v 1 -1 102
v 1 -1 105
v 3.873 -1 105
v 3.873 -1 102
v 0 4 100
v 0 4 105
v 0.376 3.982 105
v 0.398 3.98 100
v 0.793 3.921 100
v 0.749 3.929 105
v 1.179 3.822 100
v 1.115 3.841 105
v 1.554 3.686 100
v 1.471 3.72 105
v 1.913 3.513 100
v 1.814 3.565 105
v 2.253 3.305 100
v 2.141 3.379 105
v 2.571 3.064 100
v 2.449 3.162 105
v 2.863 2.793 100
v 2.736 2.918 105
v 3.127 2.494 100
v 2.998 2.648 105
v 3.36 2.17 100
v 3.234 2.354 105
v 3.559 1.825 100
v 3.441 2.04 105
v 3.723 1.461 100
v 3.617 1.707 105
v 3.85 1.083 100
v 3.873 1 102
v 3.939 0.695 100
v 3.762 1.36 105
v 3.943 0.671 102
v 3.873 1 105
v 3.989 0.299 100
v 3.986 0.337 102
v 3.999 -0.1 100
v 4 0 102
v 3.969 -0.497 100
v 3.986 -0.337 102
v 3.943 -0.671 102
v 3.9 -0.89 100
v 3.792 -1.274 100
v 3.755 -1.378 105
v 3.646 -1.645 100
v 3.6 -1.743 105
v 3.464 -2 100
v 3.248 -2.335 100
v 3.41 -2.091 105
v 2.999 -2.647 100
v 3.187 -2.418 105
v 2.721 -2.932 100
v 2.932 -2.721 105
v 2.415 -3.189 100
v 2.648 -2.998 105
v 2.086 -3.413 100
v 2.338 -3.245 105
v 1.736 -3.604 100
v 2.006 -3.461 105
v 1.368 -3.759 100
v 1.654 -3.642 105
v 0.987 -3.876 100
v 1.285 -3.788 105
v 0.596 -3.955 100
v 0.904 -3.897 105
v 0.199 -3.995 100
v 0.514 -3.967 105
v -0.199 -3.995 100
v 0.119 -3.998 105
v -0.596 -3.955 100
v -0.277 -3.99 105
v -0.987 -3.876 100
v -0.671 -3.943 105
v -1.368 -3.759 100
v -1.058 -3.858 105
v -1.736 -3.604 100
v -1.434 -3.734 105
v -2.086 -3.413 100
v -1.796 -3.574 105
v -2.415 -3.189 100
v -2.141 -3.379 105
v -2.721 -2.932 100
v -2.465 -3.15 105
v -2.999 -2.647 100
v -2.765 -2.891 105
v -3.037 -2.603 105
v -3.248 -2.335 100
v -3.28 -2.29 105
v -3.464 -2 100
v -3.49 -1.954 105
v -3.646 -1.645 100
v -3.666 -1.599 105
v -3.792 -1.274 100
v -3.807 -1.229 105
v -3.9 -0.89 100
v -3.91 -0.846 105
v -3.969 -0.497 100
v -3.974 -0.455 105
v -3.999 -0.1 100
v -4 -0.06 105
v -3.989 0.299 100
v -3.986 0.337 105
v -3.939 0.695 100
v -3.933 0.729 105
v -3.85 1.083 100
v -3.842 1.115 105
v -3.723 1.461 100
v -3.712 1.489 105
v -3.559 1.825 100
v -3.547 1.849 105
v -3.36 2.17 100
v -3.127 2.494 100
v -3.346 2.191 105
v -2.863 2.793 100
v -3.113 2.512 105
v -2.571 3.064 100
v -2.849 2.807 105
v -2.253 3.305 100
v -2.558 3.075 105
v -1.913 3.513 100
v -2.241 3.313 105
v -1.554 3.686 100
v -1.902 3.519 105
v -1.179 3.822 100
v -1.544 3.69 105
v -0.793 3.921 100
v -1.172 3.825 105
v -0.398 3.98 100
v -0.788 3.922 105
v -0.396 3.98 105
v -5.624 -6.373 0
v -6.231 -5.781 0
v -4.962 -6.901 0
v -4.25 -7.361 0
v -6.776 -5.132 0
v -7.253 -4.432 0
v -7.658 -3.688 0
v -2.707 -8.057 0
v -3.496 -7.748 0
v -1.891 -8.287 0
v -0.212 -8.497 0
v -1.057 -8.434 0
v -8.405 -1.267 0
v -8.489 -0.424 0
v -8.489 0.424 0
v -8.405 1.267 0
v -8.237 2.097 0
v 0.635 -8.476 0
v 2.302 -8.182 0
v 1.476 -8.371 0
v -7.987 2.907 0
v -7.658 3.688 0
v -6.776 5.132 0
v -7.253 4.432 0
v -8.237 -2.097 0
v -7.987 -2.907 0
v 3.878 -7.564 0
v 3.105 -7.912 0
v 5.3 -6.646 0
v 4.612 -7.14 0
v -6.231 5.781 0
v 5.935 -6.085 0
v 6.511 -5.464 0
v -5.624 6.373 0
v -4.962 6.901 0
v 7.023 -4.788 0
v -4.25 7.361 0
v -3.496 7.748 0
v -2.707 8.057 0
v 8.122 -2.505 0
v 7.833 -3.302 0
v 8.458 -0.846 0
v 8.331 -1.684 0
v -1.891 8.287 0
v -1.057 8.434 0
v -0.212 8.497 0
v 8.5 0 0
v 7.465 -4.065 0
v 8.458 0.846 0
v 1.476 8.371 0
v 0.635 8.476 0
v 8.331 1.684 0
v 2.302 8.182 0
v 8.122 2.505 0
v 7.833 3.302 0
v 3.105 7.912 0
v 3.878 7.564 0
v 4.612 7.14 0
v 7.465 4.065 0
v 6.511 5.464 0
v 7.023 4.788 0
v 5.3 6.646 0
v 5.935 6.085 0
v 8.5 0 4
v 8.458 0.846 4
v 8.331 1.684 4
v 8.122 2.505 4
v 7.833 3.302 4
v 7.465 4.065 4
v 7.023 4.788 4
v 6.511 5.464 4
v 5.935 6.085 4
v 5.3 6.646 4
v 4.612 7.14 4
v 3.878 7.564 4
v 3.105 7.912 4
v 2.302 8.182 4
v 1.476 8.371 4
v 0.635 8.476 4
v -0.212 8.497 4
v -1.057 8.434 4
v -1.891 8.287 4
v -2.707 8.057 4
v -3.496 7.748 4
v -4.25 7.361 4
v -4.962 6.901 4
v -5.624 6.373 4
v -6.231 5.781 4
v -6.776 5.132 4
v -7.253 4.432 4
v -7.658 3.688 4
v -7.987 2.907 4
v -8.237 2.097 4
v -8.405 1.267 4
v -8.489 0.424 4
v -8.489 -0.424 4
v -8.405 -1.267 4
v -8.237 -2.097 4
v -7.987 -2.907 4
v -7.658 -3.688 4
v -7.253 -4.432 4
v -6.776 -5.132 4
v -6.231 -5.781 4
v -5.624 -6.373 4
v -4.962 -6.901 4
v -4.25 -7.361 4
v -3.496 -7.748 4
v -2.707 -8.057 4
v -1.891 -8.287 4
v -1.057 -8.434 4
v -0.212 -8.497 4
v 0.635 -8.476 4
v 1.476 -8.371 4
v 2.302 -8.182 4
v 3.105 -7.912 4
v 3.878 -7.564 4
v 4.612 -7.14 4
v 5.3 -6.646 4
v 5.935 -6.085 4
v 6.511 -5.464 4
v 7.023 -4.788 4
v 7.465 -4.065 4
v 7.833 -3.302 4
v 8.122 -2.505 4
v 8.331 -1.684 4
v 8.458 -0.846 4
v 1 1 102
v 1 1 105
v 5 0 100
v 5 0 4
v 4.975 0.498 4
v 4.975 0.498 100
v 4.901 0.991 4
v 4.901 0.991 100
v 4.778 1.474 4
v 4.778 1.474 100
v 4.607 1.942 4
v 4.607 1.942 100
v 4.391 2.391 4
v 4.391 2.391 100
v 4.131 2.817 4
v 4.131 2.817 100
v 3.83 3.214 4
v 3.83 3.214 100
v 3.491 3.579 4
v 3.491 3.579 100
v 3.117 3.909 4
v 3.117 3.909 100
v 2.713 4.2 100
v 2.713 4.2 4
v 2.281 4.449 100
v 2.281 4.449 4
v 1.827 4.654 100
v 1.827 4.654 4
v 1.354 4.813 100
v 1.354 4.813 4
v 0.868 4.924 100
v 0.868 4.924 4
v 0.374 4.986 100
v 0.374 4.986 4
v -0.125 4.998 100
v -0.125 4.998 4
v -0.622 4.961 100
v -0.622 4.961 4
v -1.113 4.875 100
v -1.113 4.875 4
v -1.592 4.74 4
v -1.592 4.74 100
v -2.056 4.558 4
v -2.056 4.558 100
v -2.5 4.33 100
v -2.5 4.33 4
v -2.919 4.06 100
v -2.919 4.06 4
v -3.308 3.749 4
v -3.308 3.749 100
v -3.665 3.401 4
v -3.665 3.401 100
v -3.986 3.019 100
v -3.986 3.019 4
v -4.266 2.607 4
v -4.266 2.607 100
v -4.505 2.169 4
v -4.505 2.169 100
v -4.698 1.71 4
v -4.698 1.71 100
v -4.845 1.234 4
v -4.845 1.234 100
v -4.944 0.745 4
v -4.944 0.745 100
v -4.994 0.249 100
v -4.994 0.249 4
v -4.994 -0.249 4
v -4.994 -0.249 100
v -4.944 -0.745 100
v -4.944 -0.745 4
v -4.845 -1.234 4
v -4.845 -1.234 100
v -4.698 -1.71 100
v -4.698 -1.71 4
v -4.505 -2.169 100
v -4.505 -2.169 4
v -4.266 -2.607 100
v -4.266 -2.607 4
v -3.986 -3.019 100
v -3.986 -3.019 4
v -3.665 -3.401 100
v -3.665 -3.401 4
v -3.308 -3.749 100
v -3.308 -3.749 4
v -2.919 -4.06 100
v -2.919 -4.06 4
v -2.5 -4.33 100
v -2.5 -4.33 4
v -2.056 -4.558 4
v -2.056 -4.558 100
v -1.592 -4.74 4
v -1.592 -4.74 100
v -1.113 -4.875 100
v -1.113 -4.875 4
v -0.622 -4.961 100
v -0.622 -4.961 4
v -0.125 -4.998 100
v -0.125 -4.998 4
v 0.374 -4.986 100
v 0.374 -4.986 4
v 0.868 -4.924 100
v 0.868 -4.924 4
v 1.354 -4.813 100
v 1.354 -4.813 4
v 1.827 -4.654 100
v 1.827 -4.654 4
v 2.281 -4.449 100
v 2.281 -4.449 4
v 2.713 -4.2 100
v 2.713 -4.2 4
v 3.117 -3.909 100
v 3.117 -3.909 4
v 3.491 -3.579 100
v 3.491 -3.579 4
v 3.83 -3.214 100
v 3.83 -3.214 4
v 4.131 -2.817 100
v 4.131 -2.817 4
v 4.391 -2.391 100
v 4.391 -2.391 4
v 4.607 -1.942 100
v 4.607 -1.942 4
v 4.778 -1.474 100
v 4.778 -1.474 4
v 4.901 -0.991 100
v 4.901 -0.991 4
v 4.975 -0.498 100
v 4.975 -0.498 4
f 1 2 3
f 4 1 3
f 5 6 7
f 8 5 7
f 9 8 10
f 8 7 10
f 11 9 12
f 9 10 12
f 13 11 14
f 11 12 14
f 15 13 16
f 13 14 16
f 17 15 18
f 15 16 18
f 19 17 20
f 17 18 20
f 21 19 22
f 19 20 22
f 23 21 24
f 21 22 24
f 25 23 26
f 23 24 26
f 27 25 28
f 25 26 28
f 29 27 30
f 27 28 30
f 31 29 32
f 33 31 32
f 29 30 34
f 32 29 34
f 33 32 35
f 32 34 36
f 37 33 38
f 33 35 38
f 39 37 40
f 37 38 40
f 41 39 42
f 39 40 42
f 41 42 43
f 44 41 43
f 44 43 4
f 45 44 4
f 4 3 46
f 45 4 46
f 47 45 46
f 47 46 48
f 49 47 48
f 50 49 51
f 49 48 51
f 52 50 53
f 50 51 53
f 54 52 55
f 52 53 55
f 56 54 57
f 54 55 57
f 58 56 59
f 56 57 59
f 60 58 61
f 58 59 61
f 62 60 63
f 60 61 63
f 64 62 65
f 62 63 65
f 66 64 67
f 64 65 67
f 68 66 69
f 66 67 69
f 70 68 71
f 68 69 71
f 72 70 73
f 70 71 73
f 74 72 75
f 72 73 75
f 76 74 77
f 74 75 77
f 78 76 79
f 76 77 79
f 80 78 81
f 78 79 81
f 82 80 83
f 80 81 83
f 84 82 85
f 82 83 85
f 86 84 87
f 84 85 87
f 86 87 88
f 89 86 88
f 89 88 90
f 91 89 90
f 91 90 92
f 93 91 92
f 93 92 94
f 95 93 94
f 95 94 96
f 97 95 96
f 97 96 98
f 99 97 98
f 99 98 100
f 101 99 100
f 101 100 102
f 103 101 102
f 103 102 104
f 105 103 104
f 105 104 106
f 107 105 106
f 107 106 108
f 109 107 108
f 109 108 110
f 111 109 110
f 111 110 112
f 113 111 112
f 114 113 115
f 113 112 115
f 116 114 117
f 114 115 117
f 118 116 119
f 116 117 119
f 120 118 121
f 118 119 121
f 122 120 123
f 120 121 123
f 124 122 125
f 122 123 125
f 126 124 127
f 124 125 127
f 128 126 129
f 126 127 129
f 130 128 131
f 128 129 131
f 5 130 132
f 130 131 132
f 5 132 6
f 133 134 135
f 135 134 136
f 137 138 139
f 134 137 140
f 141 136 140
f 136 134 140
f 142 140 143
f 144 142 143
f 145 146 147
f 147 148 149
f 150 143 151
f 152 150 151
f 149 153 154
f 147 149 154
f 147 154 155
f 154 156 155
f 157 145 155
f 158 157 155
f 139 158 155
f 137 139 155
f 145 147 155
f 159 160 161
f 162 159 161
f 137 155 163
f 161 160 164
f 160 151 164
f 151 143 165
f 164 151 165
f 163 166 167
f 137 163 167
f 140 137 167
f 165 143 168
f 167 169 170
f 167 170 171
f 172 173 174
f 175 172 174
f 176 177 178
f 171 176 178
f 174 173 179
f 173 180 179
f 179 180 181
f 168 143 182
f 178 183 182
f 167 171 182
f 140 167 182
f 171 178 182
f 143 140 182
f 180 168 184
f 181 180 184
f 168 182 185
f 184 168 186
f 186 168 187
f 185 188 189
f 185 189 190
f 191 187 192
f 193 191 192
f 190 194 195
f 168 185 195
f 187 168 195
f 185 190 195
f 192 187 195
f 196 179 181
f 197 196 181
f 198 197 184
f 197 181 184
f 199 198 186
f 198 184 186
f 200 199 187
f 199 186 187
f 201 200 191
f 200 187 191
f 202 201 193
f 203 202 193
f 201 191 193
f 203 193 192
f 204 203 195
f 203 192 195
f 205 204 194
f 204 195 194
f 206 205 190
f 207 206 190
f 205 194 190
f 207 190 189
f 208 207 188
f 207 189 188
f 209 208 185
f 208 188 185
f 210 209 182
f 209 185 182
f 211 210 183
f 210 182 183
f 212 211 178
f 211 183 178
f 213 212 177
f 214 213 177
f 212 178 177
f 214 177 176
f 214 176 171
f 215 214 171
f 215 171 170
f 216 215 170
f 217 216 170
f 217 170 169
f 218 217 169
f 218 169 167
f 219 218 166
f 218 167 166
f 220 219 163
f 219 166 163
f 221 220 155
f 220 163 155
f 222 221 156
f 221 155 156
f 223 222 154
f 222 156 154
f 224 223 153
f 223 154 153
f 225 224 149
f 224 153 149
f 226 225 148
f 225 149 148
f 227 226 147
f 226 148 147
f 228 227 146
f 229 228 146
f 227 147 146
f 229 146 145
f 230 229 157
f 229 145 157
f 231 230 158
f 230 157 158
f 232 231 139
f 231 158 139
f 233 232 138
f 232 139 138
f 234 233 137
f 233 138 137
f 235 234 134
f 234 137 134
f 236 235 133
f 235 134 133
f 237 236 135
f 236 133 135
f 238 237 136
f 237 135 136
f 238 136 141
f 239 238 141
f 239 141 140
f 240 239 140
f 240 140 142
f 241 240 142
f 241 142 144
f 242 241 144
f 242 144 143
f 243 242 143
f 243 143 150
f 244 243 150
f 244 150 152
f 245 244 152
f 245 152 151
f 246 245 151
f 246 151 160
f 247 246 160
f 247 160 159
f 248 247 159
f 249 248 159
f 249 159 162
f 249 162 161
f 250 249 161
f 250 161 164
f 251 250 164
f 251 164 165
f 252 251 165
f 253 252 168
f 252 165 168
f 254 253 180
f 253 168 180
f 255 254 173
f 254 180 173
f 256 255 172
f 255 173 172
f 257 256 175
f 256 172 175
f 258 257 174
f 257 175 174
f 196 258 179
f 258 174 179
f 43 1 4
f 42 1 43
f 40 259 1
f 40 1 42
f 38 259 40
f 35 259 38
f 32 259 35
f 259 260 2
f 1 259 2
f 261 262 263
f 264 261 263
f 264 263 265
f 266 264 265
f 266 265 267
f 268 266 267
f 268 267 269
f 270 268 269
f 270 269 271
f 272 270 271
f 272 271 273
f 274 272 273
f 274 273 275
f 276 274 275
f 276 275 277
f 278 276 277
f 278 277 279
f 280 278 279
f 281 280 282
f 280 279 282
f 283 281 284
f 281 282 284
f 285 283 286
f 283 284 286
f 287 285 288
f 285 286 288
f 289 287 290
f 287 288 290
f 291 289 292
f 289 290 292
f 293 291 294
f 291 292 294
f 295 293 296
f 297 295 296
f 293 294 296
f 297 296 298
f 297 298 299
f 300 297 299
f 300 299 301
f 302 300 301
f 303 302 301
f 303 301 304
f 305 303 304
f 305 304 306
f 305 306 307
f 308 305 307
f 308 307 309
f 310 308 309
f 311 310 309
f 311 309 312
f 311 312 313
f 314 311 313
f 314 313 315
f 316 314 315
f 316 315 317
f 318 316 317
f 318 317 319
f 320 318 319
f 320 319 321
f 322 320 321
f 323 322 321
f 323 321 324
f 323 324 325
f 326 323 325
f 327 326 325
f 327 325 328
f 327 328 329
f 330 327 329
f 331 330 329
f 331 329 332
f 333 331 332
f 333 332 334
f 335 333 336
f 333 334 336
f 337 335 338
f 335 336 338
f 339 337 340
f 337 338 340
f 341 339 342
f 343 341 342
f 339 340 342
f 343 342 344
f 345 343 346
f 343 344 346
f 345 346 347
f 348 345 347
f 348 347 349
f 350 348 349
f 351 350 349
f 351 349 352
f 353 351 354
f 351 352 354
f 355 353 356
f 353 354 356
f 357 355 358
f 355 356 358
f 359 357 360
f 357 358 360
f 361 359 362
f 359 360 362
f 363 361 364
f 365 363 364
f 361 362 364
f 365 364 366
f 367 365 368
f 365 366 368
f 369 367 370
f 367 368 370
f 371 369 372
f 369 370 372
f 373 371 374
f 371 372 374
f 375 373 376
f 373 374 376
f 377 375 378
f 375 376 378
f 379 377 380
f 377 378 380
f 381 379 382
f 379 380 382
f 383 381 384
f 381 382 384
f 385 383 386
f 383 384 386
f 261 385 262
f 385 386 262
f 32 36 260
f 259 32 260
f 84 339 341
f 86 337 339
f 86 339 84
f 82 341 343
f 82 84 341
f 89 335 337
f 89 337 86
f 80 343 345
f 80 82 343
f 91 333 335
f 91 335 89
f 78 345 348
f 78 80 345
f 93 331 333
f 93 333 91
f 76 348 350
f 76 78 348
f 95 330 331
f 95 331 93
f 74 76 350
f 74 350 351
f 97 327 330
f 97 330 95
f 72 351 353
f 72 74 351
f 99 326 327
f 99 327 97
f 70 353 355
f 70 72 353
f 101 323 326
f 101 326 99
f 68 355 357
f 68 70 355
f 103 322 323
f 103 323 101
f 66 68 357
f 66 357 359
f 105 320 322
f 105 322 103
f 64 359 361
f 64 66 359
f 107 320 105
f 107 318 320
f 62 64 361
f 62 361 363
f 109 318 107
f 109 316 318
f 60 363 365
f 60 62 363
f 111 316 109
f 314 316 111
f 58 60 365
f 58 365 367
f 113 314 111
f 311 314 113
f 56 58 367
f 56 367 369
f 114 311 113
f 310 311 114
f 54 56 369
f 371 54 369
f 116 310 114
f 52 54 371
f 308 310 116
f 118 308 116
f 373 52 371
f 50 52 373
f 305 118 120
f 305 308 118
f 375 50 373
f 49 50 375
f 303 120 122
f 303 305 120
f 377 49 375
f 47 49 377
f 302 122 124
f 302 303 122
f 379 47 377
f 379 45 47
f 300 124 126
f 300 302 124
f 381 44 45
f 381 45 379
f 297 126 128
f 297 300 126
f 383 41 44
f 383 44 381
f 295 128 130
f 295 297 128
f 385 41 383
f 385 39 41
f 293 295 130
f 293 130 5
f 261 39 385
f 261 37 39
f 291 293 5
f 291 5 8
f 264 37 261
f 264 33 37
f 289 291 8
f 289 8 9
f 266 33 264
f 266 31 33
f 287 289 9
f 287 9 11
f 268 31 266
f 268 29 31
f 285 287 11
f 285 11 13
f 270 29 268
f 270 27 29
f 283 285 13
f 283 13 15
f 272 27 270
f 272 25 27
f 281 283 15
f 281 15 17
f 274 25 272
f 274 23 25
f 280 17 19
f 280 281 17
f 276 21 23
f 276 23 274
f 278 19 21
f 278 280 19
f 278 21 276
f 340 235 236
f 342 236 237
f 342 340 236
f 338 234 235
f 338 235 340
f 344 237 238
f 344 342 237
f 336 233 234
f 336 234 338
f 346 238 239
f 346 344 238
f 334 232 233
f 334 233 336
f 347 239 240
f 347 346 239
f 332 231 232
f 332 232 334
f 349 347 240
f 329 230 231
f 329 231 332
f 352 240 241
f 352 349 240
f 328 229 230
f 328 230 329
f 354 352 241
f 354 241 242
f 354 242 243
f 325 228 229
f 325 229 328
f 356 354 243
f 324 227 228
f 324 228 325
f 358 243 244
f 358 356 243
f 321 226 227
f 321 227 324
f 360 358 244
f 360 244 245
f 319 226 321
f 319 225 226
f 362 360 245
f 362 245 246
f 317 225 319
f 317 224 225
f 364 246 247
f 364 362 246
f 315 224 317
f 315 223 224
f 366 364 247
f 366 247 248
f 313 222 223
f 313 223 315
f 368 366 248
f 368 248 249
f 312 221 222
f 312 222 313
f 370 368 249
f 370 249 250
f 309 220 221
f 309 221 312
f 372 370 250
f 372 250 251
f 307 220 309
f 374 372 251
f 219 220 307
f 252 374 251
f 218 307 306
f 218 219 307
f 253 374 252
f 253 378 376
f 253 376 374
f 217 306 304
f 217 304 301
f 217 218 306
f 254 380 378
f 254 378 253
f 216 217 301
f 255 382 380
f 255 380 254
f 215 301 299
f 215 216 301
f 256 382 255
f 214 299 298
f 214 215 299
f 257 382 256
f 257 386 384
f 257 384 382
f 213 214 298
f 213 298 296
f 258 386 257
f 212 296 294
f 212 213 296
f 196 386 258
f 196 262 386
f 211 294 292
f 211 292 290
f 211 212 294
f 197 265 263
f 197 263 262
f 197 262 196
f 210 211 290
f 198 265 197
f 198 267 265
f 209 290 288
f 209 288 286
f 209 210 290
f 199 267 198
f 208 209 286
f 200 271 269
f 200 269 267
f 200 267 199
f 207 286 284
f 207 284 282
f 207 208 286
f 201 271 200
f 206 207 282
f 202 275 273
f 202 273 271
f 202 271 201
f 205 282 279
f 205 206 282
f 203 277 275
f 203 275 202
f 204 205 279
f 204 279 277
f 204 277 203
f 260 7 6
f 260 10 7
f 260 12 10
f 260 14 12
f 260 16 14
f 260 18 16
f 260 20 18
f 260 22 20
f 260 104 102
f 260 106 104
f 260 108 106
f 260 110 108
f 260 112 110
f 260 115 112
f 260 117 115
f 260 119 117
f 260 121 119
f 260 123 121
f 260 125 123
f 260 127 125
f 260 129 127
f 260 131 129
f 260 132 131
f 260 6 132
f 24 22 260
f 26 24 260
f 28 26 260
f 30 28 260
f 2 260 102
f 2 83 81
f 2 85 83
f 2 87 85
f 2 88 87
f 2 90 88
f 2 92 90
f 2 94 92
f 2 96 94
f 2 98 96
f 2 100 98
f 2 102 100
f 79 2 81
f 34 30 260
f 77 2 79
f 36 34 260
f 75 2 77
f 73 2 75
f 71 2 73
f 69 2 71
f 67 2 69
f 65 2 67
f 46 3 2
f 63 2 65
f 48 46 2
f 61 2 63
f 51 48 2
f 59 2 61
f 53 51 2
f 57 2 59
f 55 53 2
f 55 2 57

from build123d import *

# Parameters (mm, degrees)
F0_R     = 8.5
F1_DEPTH = 4
F3_R     = 5
F4_DEPTH = 100
F5_W     = 4
F5_H     = 5
F9_DEPTH = 3


with BuildPart() as f1:
    # F0 (on Top) → F1 (new body)
    with BuildSketch(Plane.XY):
        Circle(F0_R)
    extrude(amount=F1_DEPTH)

    # F3 (on Top) → F4 (join)
    with BuildSketch(Plane.XY):
        Circle(F3_R)
    extrude(amount=F4_DEPTH)

    # F5 (on Right) → F6 (revolve)
    with BuildSketch(Plane.YZ):
        with Locations((2, 102.5)):
            Rectangle(F5_W, F5_H)
    revolve(axis=Axis((0, 0, 102.5), (0, 0, -1)))

    # F8 (on face) → F9 (cut)
    with BuildSketch(Plane.XY.offset(105)):
        with BuildLine():
            Line((3.8729833462, 1), (1, 1))
            Line((1, 1), (1, -1))
            Line((1, -1), (3.8729833462, -1))
            ThreePointArc((3.8729833462, -1), (3.9681187851, -0.5040171699), (4, 0))
            ThreePointArc((4, 0), (3.9681187851, 0.5040171699), (3.8729833462, 1))
        make_face()
    extrude(amount=-F9_DEPTH, mode=Mode.SUBTRACT)


solid = f1.part
